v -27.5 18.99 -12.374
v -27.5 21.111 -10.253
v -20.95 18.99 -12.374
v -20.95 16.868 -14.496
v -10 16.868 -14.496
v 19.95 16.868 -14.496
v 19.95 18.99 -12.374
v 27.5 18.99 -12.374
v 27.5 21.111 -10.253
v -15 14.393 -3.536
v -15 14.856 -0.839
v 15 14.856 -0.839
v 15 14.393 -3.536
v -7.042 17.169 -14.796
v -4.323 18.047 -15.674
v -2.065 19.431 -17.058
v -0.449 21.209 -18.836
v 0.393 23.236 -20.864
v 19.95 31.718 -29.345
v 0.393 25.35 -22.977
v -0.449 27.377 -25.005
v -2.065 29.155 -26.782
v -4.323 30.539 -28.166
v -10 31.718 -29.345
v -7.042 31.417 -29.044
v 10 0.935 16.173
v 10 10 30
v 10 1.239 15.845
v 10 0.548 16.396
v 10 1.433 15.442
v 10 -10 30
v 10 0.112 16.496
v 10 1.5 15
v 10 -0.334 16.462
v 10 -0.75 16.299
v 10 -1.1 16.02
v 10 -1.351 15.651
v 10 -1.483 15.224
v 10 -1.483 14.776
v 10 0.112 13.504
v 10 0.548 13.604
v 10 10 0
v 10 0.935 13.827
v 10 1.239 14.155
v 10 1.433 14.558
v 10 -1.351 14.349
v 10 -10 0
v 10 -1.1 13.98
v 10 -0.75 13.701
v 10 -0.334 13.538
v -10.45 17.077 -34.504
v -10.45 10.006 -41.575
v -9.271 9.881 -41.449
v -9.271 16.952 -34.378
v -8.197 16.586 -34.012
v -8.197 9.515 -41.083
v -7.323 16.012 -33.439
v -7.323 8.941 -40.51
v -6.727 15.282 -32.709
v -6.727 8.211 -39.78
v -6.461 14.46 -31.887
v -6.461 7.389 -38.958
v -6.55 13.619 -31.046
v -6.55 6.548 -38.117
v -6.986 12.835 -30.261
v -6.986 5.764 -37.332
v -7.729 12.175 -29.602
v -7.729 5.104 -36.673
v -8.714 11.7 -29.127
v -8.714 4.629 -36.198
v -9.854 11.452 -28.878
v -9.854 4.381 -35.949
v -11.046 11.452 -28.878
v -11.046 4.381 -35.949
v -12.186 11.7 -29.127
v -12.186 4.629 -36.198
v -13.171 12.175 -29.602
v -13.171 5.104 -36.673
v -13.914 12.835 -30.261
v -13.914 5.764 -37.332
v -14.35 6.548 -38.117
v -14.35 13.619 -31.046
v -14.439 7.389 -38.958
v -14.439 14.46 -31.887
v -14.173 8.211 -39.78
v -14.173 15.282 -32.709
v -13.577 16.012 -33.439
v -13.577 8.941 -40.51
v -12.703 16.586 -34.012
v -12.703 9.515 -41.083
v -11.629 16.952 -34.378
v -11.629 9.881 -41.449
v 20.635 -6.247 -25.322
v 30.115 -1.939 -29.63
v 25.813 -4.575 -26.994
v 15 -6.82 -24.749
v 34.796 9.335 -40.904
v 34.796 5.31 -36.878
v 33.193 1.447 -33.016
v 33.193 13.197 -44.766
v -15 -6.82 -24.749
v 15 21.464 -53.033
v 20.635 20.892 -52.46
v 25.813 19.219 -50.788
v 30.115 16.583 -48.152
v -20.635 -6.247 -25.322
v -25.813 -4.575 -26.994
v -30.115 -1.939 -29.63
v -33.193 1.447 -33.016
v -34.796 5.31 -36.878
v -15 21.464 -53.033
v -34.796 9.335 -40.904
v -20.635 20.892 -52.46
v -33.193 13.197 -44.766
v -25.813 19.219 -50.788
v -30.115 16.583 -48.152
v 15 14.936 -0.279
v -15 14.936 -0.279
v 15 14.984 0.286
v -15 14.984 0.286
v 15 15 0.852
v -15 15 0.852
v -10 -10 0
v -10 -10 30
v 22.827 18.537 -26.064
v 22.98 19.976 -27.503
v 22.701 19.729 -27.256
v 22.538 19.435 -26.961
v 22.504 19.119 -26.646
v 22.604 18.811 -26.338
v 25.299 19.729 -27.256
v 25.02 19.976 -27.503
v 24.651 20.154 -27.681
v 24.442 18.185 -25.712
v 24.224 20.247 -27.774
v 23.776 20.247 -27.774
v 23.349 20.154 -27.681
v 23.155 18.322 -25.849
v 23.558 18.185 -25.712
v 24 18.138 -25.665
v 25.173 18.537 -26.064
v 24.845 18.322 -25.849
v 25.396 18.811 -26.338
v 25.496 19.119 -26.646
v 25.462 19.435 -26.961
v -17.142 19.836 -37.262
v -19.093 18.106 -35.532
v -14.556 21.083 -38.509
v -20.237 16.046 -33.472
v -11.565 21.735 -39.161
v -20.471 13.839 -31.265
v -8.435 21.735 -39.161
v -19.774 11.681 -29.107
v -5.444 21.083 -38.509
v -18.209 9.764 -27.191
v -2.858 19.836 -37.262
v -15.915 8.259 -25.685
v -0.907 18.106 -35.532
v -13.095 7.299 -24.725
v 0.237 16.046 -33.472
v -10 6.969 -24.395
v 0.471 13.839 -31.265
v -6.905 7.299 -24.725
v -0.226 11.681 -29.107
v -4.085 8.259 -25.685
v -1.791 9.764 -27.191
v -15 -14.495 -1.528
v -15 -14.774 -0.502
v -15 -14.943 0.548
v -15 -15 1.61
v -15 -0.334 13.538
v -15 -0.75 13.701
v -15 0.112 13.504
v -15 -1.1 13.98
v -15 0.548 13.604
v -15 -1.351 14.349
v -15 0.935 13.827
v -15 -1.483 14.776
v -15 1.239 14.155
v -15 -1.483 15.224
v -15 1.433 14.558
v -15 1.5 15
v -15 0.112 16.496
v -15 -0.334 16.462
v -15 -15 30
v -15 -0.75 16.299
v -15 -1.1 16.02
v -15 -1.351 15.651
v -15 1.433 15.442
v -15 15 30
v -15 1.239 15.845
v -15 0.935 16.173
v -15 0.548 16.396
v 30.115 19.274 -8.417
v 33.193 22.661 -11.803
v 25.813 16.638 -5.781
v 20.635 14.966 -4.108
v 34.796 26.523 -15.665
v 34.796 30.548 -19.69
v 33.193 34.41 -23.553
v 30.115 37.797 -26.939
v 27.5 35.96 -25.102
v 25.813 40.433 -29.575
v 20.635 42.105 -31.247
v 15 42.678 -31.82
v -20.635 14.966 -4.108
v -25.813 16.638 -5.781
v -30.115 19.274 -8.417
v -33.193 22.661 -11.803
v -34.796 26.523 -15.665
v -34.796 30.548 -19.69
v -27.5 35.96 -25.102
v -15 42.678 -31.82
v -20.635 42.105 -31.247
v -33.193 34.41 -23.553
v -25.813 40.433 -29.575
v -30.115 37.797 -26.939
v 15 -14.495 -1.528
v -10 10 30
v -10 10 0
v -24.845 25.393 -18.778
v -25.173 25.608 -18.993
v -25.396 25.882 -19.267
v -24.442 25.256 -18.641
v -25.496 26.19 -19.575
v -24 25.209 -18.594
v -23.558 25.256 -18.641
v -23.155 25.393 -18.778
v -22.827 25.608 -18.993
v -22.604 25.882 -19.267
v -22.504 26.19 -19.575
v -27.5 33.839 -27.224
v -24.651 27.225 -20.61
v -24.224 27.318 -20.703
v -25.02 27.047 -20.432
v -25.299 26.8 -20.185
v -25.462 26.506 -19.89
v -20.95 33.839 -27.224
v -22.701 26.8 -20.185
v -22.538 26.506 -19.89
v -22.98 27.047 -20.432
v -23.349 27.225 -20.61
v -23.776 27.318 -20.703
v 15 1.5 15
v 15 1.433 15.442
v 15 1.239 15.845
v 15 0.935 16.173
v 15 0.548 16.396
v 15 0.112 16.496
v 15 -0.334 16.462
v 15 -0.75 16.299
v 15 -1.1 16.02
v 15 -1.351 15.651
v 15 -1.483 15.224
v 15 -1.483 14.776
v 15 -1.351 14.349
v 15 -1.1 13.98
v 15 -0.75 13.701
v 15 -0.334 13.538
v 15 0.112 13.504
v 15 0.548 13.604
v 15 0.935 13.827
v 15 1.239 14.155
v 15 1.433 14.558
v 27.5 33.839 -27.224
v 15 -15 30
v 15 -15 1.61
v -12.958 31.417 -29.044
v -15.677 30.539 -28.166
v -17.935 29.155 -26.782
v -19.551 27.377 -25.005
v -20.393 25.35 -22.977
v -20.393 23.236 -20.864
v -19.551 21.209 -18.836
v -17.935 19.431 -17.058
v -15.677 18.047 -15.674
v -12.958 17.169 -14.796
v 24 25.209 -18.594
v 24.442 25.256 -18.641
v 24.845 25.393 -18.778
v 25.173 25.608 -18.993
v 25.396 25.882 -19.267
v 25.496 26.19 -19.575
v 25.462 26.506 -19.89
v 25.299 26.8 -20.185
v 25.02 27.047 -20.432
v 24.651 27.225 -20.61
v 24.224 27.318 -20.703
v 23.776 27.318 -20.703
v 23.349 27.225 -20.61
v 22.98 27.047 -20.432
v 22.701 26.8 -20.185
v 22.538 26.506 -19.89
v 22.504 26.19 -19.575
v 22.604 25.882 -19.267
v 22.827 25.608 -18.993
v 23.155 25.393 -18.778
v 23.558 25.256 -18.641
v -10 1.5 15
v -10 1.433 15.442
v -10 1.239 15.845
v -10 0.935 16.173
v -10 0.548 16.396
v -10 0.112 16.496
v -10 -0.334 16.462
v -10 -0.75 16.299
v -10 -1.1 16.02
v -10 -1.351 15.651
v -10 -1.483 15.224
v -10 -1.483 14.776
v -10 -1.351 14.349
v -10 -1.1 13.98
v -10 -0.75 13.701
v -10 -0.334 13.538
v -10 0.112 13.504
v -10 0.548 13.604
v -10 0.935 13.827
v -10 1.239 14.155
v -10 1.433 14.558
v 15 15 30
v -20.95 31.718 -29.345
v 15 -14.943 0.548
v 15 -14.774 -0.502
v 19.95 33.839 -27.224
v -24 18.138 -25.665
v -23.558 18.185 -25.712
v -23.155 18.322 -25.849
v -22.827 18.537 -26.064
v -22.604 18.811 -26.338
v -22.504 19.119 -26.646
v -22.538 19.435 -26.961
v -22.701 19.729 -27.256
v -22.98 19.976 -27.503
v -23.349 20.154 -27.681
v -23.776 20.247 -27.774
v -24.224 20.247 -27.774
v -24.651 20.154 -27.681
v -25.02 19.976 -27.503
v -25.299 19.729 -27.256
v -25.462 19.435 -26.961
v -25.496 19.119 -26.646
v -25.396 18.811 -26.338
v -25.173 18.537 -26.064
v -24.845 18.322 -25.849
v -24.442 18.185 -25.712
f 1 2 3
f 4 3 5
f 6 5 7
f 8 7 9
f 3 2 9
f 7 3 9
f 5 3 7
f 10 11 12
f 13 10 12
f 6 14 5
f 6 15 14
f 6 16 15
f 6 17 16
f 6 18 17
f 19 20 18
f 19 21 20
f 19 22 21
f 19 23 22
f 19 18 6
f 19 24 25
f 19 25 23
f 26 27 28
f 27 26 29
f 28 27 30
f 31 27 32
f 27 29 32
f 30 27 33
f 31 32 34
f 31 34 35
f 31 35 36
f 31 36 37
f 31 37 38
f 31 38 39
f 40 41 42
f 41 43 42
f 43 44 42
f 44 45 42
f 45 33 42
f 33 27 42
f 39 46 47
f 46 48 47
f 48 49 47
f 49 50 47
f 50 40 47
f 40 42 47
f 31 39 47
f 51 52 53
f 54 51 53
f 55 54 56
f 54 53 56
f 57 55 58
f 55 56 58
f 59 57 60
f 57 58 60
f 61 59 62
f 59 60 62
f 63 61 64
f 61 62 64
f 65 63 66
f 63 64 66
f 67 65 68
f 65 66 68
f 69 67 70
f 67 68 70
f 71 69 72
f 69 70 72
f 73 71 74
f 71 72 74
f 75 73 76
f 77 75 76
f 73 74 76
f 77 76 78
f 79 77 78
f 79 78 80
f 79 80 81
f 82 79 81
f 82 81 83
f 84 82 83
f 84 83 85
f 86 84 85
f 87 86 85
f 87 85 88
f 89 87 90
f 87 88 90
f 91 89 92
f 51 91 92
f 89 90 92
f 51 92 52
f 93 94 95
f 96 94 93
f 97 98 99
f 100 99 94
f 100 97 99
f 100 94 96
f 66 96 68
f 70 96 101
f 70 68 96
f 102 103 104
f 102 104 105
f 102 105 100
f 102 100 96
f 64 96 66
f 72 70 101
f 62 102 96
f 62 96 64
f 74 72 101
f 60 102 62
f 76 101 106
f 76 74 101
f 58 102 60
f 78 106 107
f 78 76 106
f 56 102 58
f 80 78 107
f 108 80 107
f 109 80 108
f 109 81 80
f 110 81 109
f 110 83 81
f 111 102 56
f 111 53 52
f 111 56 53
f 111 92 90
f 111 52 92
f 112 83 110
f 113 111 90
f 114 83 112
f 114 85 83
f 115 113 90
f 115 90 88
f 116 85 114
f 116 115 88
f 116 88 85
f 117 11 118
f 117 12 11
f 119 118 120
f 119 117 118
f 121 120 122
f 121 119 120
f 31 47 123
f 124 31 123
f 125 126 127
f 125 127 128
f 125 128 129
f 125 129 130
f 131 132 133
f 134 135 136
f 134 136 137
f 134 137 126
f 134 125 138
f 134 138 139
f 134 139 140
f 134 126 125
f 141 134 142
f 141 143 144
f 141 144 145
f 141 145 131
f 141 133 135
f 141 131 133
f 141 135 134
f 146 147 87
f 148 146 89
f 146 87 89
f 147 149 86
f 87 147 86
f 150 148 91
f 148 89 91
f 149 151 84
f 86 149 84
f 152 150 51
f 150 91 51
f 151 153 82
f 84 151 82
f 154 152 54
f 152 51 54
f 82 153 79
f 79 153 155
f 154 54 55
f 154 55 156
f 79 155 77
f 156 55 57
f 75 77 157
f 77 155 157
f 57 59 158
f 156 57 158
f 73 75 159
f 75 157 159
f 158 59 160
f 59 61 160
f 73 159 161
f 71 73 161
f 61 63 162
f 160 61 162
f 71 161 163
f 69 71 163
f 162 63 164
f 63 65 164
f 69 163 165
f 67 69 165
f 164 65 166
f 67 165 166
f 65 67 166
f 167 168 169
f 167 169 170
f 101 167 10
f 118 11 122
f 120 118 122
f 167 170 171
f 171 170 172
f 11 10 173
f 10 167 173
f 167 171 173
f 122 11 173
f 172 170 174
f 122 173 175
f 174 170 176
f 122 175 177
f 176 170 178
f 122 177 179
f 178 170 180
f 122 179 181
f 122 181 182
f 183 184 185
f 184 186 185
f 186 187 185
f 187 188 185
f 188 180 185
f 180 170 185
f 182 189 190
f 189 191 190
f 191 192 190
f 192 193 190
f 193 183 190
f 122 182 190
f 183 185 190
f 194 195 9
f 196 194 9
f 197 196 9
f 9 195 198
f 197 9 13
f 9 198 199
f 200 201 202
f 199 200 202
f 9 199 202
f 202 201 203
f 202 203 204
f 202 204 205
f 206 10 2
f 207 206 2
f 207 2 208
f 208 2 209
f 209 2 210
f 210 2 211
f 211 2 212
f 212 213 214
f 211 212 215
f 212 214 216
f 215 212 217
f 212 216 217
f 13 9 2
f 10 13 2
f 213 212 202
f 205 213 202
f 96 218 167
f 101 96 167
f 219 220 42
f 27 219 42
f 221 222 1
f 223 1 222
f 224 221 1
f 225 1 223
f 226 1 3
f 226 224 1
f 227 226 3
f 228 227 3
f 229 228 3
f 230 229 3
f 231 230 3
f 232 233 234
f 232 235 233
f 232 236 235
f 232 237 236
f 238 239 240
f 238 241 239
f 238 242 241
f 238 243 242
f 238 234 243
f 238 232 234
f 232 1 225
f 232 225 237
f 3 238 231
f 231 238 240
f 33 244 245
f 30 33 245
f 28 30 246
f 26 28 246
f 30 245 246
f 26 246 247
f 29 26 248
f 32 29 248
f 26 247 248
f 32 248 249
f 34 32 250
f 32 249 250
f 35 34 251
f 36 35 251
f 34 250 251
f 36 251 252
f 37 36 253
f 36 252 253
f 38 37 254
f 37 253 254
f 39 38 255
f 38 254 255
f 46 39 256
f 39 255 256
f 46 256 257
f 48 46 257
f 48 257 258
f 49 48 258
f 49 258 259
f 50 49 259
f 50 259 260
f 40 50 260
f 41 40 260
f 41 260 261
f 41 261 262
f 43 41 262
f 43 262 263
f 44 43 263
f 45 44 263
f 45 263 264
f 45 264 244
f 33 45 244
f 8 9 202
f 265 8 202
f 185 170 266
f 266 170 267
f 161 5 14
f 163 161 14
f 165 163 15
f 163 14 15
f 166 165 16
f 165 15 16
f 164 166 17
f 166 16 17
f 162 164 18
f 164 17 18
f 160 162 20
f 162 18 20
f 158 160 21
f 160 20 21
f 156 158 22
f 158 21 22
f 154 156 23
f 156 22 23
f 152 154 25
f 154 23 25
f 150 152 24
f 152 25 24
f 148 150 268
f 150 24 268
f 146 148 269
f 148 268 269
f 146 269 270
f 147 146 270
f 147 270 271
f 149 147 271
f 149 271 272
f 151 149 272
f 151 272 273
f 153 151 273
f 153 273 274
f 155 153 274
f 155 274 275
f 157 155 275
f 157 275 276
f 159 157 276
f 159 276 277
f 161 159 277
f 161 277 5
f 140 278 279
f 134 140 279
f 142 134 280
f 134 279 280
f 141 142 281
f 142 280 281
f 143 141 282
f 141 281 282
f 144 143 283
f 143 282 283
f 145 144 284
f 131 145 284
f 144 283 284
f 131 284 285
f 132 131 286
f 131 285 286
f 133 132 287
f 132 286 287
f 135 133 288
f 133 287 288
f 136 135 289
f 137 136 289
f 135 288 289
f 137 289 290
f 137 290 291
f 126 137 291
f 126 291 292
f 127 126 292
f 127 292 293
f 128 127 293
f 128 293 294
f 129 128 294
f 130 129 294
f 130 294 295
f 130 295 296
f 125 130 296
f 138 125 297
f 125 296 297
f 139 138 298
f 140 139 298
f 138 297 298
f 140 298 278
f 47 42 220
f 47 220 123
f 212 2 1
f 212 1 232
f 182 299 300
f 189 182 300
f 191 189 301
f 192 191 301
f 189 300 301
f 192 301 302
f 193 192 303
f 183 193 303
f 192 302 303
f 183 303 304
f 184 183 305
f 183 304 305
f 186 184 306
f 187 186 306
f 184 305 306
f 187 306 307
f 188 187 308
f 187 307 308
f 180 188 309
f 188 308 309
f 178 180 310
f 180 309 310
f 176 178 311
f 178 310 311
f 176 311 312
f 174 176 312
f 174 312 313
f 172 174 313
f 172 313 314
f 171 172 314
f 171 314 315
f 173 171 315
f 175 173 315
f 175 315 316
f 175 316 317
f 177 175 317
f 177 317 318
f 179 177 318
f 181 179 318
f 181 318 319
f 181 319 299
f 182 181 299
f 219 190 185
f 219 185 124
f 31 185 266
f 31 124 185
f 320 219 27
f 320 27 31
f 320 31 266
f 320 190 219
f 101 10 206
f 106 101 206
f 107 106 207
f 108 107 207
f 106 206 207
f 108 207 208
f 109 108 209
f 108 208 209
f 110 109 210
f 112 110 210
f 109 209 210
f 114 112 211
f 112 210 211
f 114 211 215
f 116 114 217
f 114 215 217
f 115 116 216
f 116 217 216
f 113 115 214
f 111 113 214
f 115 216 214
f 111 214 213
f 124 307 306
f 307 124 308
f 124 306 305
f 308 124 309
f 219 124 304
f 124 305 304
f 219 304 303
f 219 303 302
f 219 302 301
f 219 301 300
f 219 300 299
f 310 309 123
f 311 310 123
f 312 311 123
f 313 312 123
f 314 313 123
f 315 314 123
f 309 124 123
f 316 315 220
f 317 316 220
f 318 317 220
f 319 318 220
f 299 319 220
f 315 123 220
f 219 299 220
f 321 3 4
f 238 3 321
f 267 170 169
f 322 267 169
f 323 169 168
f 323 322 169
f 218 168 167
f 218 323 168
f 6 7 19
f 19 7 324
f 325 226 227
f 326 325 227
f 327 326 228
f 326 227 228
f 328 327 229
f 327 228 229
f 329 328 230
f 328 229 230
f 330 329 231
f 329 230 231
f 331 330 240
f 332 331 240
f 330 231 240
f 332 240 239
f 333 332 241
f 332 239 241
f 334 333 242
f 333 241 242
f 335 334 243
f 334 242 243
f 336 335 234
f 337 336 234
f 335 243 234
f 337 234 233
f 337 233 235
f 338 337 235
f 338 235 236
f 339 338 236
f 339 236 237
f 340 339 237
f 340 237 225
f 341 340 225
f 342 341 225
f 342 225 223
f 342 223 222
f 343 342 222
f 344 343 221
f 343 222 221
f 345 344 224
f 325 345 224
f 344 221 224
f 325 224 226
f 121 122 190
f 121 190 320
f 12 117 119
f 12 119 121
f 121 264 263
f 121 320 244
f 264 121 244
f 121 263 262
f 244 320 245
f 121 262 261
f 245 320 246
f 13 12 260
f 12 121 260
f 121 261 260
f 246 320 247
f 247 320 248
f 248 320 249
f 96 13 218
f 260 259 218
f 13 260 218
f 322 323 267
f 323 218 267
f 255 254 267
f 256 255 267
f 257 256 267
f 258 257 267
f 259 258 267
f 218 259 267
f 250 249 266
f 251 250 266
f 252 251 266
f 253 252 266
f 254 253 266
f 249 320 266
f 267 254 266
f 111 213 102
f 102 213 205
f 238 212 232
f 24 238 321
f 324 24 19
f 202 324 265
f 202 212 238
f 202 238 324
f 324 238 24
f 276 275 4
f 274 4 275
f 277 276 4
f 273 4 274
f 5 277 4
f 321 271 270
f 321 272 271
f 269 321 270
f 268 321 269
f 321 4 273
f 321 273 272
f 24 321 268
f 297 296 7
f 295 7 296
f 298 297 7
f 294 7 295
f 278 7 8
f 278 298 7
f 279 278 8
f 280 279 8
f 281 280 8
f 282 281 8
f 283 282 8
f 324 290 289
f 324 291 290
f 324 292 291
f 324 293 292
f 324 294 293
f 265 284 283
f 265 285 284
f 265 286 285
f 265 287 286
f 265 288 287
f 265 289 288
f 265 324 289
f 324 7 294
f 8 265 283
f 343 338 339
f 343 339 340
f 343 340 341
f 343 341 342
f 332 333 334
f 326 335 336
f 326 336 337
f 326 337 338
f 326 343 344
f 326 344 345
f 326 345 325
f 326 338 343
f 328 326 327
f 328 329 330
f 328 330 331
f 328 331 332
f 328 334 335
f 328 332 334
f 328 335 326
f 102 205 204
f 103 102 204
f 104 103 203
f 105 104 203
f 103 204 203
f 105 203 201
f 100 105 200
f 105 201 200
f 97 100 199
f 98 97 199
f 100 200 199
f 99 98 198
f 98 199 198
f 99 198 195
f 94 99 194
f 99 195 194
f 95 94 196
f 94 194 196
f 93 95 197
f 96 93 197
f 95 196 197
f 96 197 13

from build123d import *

# Parameters (mm, degrees)
SKETCH1_W           = 30
SKETCH1_H           = 30
BOSS_EXTRUDE1_DEPTH = 30
BOSS_EXTRUDE3_DEPTH = 30
SKETCH19_W          = 55
SKETCH19_H          = 21
CUT_EXTRUDE2_DEPTH  = 3
SKETCH20_R          = 1.5
CUT_EXTRUDE3_DEPTH  = 10
SKETCH21_R          = 10.5
CUT_EXTRUDE4_DEPTH  = 30
SKETCH22_W          = 40.9
SKETCH22_H          = 21
CUT_EXTRUDE7_DEPTH  = 3
FILLET2_R           = 10
FILLET3_R           = 10
SKETCH23_R          = 1.5
CUT_EXTRUDE8_DEPTH  = 30
SKETCH24_W          = 23.993806076
SKETCH24_H          = 21.426788773
SKETCH24_R          = 4
BOSS_EXTRUDE4_DEPTH = 10
SKETCH25_W          = 20
SKETCH25_H          = 20
CUT_EXTRUDE10_DEPTH = 30


with BuildPart() as part:
    # Sketch1 → Boss-Extrude1 (new body)
    with BuildSketch(Plane.XY):
        Rectangle(SKETCH1_W, SKETCH1_H)
        Polygon((-3.181061689, 4.218151635), (-0.042296032, 4.218151635), (3.181061689, 4.218151635), (5.633333333, 6.670423279), (5.633333333, 8.284397195), (2.733333333, 8.284397195), (2.733333333, 10), (10, 10), (10, 2.733333333), (8.80386145, 2.733333333), (8.80386145, 5.633333333), (6.670423279, 5.633333333), (4.218151635, 3.181061689), (4.218151635, 0.042296032), (4.218151635, -3.181061689), (6.670423279, -5.633333333), (8.284397195, -5.633333333), (8.284397195, -2.733333333), (10, -2.733333333), (10, -10), (2.733333333, -10), (2.733333333, -8.80386145), (5.633333333, -8.80386145), (5.633333333, -6.670423279), (3.181061689, -4.218151635), (0.042296032, -4.218151635), (-3.181061689, -4.218151635), (-5.633333333, -6.670423279), (-5.633333333, -8.284397195), (-2.733333333, -8.284397195), (-2.733333333, -10), (-10, -10), (-10, -2.733333333), (-8.80386145, -2.733333333), (-8.80386145, -5.633333333), (-6.670423279, -5.633333333), (-4.218151635, -3.181061689), (-4.218151635, -0.042296032), (-4.218151635, 3.181061689), (-6.670423279, 5.633333333), (-8.284397195, 5.633333333), (-8.284397195, 2.733333333), (-10, 2.733333333), (-10, 10), (-2.733333333, 10), (-2.733333333, 8.80386145), (-5.633333333, 8.80386145), (-5.633333333, 6.670423279), align=None, mode=Mode.SUBTRACT)
    extrude(amount=BOSS_EXTRUDE1_DEPTH)



with BuildPart() as body_2:
    # Sketch9 → Boss-Extrude3 (new body)
    with BuildSketch(Plane(origin=(15, 17.928932188, -7.071067812), x_dir=(1, 0, 0), z_dir=(0, 0.7071067811865437, 0.7071067811865515))):
        with BuildLine():
            Line((0, -5), (-30, -5))
            ThreePointArc((-30, -5), (-50, 15), (-30, 35))
            Line((-30, 35), (0, 35))
            ThreePointArc((0, 35), (20, 15), (0, -5))
        make_face()
    extrude(amount=-BOSS_EXTRUDE3_DEPTH)


with BuildPart() as part_1:
    add(part.part)

    add(body_2.part)  # Loft5 merges body 2
    # Sketch16 → Loft5 section 0
    with BuildSketch(Plane(origin=(0, 8.964466094, -8.964466094), x_dir=(1, 0, 0), z_dir=(0, -0.7071067811865513, 0.7071067811865438))):
        with BuildLine():
            Line((-15, 7.67766953), (15, 7.67766953))
            Line((15, 7.67766953), (15, -22.32233047))
            Line((15, -22.32233047), (-15, -22.32233047))
            Line((-15, -22.32233047), (-15, 7.67766953))
        make_face()
    # Sketch17 → Loft5 section 1
    with BuildSketch(Plane(origin=(0, 0, 0), x_dir=(-1, 0, 0), z_dir=(0, 0, -1))):
        with BuildLine():
            Line((15, 15), (-15, 15))
            Line((-15, 15), (-15, -15))
            Line((-15, -15), (15, -15))
            Line((15, -15), (15, 15))
        make_face()
    loft()

    # Sketch19 → Cut-Extrude2 (cut)
    with BuildSketch(Plane(origin=(0, 5.428932188, 5.428932188), x_dir=(1, 0, 0), z_dir=(0, 0.7071067811865438, 0.7071067811865513))):
        with Locations((0, 32.67766953)):
            Rectangle(SKETCH19_W, SKETCH19_H)
    extrude(amount=-CUT_EXTRUDE2_DEPTH, mode=Mode.SUBTRACT)

    # Sketch20 → Cut-Extrude3 (cut)
    with BuildSketch(Plane(origin=(0, 3.307611845, 3.307611845), x_dir=(1, 0, 0), z_dir=(0, 0.7071067811865438, 0.7071067811865512))):
        with Locations(Location((24, 32.473176799, 0), (0, 0, 270))):
            Circle(SKETCH20_R)
        with Locations(Location((-24, 32.473176799, 0), (0, 0, 270))):
            Circle(SKETCH20_R)
    extrude(amount=-CUT_EXTRUDE3_DEPTH, mode=Mode.SUBTRACT)

    # Sketch21 → Cut-Extrude4 (cut)
    with BuildSketch(Plane(origin=(0, 3.307611845, 3.307611845), x_dir=(1, 0, 0), z_dir=(0, 0.7071067811865438, 0.7071067811865512))):
        with Locations(Location((-10, 32.67766953, 0), (0, 0, 270))):
            Circle(SKETCH21_R)
    extrude(amount=-CUT_EXTRUDE4_DEPTH, mode=Mode.SUBTRACT)

    # Sketch22 → Cut-Extrude7 (cut)
    with BuildSketch(Plane(origin=(0, 3.307611845, 3.307611845), x_dir=(1, 0, 0), z_dir=(0, 0.7071067811865438, 0.7071067811865512))):
        with Locations((-0.5, 32.67766953)):
            Rectangle(SKETCH22_W, SKETCH22_H)
    extrude(amount=-CUT_EXTRUDE7_DEPTH, mode=Mode.SUBTRACT)

    # Fillet2
    fillet2_edges = [part_1.edges().sort_by_distance(p)[0] for p in [
        (0, 15, 0),
    ]]
    fillet(fillet2_edges, radius=FILLET2_R)

    # Fillet3
    fillet3_edges = [part_1.edges().sort_by_distance(p)[0] for p in [
        (0, -15, 0),
    ]]
    fillet(fillet3_edges, radius=FILLET3_R)

    # Sketch23 → Cut-Extrude8 (cut)
    with BuildSketch(Plane(origin=(15, 0, 0), x_dir=(0, 0, -1), z_dir=(1, 0, 0))):
        with Locations(Location((-15, 0, 0), (0, 0, 90))):
            Circle(SKETCH23_R)
    extrude(amount=-CUT_EXTRUDE8_DEPTH, mode=Mode.SUBTRACT)

    # Sketch24 → Boss-Extrude4 (add)
    with BuildSketch(Plane(origin=(0, -15.784271247, -15.784271247), x_dir=(1, 0, 0), z_dir=(0, -0.7071067811865438, -0.7071067811865513))):
        with Locations((-10.45, -32.473176799)):
            Rectangle(SKETCH24_W, SKETCH24_H)
        with Locations(Location((-10.45, -32.473176799, 0), (0, 0, 270))):
            Circle(SKETCH24_R, mode=Mode.SUBTRACT)
    extrude(amount=-BOSS_EXTRUDE4_DEPTH)

    # Sketch25 → Cut-Extrude10 (cut)
    with BuildSketch(Plane.XY.offset(30)):
        Rectangle(SKETCH25_W, SKETCH25_H)
    extrude(amount=-CUT_EXTRUDE10_DEPTH, mode=Mode.SUBTRACT)


solid = part_1.part
